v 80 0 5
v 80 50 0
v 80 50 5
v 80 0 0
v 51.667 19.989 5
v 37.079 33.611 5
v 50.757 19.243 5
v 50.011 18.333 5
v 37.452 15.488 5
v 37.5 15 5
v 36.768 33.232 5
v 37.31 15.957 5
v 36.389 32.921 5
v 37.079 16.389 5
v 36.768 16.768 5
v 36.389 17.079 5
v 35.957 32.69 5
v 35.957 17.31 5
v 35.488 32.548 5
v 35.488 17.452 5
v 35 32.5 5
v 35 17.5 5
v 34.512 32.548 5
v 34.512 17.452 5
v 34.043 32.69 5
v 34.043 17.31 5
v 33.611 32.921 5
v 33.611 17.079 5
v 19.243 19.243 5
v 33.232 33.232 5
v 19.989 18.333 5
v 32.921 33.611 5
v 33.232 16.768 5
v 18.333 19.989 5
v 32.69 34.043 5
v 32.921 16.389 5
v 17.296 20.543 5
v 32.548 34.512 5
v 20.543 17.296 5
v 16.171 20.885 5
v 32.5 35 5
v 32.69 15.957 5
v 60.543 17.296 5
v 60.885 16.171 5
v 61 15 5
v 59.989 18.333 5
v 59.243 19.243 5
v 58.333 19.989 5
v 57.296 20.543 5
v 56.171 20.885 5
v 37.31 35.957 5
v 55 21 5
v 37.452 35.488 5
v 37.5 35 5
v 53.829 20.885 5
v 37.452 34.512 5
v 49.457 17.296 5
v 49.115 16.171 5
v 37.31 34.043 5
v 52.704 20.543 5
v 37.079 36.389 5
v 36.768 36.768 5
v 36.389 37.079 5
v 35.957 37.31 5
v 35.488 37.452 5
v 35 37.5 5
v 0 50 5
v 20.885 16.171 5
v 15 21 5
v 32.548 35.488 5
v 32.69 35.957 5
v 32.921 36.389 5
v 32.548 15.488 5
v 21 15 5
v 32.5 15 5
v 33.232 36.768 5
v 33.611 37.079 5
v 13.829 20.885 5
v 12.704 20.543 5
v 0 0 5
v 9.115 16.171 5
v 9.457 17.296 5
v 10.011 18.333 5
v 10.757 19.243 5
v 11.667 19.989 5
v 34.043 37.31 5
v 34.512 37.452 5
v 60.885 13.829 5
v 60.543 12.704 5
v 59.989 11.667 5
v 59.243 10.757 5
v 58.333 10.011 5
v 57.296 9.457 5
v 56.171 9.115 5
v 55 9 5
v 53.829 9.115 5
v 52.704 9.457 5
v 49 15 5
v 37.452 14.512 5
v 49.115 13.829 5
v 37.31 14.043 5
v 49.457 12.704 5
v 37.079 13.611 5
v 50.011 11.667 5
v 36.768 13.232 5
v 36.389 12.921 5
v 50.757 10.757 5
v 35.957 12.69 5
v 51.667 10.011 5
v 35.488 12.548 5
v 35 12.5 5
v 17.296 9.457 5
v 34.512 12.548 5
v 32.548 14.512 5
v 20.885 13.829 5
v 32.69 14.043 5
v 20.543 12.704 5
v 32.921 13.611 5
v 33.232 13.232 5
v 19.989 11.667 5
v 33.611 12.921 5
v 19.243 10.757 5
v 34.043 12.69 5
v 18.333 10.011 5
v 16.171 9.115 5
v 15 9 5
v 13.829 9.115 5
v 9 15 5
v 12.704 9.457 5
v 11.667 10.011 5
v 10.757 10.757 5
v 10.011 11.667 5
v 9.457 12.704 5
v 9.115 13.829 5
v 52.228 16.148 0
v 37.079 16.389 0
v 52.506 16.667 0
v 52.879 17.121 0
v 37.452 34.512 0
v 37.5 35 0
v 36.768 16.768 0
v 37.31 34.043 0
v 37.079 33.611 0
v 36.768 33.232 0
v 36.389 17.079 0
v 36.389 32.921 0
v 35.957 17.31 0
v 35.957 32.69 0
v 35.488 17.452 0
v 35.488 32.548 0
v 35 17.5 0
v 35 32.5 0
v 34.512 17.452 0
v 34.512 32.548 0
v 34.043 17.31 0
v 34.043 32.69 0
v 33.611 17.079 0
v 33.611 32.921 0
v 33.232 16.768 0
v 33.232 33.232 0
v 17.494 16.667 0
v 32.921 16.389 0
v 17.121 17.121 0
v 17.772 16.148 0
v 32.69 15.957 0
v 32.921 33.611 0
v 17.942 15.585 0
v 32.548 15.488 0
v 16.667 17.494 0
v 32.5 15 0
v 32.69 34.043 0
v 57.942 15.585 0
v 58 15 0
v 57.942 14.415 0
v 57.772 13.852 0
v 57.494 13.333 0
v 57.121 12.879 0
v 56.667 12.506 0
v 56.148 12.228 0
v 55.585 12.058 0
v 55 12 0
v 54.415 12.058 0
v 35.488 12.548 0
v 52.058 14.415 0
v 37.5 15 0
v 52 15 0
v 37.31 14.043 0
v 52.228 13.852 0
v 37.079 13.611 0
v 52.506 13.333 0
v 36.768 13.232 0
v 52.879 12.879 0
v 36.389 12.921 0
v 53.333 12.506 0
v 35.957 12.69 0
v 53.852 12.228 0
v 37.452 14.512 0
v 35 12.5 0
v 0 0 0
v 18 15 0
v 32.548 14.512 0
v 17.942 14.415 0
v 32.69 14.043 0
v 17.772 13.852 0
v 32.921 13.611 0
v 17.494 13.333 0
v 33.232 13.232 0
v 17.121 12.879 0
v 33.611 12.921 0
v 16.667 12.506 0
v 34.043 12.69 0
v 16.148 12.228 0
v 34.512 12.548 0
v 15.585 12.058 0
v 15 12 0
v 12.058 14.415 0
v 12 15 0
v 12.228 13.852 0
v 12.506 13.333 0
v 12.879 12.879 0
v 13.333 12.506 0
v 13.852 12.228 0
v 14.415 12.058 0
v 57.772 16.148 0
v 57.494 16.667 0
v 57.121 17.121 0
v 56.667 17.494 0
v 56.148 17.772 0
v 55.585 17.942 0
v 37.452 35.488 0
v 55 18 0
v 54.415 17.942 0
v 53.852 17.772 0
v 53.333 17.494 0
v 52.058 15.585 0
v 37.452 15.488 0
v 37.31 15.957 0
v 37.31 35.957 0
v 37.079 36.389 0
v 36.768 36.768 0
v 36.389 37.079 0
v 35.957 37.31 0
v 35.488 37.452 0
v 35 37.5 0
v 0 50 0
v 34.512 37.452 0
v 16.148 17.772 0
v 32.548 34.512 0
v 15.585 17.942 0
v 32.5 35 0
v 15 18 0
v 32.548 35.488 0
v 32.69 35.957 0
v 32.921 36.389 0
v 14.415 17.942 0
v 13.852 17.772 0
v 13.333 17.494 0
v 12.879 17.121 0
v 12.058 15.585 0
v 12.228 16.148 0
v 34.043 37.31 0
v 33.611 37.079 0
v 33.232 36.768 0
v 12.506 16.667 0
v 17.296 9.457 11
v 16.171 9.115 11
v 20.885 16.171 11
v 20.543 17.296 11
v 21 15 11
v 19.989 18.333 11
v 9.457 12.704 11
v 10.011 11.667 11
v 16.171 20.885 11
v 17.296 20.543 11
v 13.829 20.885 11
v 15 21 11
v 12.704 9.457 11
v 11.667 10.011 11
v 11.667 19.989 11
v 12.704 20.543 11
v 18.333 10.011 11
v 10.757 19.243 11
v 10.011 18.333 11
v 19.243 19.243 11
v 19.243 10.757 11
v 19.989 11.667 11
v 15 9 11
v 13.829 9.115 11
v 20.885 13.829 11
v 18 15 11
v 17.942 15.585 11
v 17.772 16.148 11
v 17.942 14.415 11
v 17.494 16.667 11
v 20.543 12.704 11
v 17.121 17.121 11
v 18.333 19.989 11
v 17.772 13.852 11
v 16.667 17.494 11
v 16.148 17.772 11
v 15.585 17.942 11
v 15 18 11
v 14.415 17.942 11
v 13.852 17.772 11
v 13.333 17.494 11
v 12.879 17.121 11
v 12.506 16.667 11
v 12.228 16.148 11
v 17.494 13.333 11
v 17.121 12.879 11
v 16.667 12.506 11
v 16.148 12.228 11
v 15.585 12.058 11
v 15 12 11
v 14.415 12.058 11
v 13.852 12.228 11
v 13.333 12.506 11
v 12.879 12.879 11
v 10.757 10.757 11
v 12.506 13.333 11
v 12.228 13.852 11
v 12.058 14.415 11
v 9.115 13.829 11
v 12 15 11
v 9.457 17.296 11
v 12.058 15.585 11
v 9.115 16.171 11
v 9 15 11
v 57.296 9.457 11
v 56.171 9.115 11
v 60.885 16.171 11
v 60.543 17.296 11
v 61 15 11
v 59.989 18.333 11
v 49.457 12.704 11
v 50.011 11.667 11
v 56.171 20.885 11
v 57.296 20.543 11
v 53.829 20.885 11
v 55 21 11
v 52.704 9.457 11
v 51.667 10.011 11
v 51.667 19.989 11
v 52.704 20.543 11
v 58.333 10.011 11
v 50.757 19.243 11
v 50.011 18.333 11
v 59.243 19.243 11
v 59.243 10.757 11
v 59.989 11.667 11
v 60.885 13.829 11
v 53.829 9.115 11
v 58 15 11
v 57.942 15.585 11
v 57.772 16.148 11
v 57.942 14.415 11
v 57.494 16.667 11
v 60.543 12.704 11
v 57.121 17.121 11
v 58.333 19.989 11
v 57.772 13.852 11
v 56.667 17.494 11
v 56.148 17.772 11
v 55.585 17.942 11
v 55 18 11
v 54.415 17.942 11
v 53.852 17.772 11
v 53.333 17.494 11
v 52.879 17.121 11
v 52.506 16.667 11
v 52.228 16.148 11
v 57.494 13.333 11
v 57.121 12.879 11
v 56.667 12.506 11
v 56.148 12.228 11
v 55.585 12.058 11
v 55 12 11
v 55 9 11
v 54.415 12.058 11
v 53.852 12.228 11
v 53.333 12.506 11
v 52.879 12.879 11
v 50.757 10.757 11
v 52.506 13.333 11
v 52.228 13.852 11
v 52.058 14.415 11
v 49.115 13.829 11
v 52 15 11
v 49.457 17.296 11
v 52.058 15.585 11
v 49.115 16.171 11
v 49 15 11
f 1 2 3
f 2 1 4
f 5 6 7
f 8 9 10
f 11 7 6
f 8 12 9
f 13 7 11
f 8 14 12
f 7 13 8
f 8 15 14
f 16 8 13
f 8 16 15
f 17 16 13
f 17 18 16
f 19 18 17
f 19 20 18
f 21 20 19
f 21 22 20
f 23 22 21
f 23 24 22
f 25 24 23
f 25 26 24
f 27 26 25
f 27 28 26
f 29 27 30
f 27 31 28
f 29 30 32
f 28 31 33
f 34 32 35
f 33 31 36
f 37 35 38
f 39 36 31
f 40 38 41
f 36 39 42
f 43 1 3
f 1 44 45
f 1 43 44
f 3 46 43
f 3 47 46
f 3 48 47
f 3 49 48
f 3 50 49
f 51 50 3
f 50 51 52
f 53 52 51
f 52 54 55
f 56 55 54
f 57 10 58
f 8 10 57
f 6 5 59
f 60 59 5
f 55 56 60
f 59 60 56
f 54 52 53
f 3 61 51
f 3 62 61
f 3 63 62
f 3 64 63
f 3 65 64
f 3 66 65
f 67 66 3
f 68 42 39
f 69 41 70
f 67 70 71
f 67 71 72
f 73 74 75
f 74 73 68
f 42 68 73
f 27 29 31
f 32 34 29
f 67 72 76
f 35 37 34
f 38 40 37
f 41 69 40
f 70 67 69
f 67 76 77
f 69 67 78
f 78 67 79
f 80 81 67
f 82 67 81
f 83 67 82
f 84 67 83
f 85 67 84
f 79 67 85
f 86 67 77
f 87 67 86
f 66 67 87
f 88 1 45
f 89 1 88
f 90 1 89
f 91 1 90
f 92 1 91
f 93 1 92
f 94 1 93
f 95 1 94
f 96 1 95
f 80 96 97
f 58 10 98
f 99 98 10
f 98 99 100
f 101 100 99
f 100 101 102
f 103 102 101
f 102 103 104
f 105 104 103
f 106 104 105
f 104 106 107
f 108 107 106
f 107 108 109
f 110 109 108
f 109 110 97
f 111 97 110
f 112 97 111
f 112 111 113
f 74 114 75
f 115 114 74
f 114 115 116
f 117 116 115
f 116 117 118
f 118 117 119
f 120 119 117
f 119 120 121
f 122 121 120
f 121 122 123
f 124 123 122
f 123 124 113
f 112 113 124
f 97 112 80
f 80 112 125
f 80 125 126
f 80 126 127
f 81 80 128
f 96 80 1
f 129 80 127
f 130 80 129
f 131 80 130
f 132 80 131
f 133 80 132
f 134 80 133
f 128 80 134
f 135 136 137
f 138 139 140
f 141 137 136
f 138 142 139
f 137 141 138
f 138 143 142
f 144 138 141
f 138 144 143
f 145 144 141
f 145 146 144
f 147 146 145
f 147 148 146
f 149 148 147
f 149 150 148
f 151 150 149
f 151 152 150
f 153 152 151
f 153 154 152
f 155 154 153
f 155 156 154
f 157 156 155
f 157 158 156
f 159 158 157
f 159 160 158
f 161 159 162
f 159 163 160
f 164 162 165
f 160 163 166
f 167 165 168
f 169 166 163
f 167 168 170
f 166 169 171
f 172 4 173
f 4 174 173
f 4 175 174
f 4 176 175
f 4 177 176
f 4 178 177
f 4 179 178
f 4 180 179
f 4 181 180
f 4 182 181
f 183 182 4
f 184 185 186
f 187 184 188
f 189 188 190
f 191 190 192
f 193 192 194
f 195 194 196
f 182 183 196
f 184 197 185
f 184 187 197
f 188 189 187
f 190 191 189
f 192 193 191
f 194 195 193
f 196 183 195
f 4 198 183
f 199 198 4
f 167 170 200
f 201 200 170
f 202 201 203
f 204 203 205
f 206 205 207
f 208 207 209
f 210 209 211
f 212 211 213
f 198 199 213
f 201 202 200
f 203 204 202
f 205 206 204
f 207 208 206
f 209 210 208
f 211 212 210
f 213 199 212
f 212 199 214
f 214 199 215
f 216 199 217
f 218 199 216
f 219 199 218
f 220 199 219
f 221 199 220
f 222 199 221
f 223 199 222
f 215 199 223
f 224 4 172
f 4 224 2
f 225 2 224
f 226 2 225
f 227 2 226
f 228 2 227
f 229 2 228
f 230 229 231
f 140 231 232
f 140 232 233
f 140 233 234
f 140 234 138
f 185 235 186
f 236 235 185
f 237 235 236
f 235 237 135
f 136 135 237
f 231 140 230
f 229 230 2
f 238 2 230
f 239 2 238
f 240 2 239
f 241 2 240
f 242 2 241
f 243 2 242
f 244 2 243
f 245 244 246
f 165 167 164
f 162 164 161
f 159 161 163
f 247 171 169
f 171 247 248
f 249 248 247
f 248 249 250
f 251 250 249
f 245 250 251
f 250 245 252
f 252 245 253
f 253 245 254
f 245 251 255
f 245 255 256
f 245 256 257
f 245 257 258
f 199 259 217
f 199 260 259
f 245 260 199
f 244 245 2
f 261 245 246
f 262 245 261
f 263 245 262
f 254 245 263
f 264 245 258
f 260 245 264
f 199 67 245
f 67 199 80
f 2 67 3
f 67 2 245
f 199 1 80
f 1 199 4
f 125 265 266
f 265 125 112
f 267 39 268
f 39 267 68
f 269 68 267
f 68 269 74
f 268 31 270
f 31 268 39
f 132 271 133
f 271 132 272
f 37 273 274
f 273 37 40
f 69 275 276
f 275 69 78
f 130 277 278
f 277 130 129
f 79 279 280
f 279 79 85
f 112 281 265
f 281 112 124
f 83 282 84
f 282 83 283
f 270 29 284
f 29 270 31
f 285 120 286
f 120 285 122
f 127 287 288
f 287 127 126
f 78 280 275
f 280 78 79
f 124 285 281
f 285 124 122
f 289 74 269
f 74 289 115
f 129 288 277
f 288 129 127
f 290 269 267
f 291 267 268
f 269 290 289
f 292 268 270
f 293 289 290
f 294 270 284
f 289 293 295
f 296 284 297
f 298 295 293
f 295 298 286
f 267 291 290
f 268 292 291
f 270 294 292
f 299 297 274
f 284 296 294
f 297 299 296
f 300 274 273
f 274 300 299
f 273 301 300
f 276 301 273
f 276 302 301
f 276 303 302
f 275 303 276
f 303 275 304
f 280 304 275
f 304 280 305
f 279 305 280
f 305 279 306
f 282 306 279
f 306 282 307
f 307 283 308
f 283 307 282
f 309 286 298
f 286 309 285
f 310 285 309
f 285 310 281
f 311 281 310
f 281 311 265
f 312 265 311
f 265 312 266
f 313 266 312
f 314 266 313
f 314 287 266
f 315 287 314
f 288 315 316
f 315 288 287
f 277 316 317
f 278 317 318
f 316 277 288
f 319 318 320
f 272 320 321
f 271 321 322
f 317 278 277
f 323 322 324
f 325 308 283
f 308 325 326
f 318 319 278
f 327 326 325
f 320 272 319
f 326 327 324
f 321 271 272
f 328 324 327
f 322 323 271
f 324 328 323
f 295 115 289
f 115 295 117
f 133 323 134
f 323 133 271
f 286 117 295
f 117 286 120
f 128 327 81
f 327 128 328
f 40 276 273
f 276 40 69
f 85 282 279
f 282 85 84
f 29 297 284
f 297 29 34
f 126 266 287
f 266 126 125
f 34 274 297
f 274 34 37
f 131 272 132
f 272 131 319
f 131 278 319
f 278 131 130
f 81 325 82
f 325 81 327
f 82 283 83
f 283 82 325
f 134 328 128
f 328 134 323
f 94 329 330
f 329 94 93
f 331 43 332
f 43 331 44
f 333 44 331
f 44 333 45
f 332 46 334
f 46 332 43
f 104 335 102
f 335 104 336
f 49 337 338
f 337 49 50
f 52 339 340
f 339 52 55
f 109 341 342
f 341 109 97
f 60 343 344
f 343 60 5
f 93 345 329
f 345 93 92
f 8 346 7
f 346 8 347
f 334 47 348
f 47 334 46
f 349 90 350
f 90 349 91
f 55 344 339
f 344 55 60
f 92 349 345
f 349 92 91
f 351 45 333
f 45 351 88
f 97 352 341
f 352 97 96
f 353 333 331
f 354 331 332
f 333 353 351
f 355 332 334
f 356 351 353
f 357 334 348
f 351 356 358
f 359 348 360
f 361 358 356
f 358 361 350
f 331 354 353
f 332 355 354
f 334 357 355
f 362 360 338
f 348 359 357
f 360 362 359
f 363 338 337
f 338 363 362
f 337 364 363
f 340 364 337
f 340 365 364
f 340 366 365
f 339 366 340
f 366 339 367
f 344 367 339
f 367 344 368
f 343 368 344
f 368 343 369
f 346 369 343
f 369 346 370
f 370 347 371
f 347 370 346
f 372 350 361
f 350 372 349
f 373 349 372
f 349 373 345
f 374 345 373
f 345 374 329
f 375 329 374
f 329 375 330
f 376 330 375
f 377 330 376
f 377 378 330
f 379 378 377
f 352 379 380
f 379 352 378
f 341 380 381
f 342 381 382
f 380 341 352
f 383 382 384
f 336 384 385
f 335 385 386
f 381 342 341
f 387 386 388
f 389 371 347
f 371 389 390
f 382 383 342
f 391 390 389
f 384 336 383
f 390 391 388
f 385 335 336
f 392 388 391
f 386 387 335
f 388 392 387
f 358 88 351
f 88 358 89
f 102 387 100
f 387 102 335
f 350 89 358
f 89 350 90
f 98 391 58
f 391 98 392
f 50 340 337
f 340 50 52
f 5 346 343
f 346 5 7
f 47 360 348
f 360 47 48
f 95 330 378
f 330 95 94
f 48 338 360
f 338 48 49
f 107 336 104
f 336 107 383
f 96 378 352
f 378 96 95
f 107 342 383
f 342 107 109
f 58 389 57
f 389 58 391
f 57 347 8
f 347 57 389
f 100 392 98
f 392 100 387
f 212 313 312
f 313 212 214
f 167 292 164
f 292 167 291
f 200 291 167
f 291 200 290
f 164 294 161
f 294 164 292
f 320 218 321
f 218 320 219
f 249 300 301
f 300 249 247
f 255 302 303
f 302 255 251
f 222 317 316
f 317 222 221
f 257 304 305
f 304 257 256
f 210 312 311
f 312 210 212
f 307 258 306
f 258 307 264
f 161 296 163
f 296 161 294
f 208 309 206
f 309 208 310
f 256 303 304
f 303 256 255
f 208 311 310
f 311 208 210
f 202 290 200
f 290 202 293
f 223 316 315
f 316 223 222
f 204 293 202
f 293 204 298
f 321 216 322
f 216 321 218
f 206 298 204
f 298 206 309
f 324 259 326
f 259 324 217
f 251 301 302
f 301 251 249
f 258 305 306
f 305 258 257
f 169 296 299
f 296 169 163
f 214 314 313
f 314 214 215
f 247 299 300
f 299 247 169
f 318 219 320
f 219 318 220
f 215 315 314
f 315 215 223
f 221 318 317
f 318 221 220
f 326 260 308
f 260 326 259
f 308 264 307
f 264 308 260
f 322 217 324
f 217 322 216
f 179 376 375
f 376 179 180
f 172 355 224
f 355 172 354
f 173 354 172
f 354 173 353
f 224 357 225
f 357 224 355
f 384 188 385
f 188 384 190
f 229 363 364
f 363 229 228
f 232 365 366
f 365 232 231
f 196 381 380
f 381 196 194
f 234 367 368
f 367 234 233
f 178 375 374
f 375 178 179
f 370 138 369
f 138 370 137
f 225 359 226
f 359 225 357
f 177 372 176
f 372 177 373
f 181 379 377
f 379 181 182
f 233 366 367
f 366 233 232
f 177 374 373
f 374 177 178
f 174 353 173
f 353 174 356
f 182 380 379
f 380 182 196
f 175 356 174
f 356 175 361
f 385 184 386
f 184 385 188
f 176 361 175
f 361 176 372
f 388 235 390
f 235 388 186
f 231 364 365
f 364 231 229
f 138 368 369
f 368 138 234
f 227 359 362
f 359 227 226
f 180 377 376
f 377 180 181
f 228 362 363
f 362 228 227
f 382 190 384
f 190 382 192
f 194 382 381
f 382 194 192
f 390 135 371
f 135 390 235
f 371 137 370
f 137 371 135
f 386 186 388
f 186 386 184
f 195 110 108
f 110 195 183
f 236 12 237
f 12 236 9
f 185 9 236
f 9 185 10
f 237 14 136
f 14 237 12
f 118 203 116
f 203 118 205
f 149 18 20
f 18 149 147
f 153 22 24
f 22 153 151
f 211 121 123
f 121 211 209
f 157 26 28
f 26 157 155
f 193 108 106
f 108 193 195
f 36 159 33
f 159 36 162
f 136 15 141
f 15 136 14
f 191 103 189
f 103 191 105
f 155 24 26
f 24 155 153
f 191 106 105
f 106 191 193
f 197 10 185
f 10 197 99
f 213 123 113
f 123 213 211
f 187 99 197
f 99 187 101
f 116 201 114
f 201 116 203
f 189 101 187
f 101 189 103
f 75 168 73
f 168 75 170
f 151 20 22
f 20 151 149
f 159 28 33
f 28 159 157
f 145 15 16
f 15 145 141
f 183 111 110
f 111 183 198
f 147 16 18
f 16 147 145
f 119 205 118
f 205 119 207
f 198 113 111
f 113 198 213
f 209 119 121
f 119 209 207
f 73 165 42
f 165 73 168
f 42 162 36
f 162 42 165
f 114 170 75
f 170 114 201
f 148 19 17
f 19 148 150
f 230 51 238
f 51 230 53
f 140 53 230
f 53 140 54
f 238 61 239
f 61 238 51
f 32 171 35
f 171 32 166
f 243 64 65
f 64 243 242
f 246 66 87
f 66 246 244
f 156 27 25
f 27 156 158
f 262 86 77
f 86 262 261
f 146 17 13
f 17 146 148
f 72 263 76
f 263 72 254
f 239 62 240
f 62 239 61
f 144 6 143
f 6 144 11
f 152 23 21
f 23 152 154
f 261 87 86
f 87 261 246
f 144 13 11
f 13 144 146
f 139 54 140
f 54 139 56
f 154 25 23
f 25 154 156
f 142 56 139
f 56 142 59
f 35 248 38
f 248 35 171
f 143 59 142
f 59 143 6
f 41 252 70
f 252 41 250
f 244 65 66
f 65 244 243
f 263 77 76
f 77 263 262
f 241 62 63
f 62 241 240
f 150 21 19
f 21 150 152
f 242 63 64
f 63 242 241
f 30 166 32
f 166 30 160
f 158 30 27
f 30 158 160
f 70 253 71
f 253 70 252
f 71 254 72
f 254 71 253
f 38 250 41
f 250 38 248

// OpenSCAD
$fn = 32;

// ----------------------------------------------------------------------
// Mixed field: bosses and holes at given coordinates
// ----------------------------------------------------------------------

// --- parameters (mm) ---
plate_l = 80;             // plate length, X
plate_w = 50;             // plate width, Y
plate_t = 5;              // plate thickness, Z
boss_d = 12;              // boss diameter
boss_h = 6;               // boss height above the plate
hole_d = 5;               // through hole diameter
fit_tol = 0.05;           // tolerance for press fits, mm
free_tol = 0.2;           // tolerance for clearance fits, mm

total_h = plate_t + boss_h;  // overall height

difference() {
  union() {
    cube([plate_l, plate_w, plate_t]);
    translate([15, 15, plate_t]) cylinder(h = boss_h, d = boss_d);
    translate([55, 15, plate_t]) cylinder(h = boss_h, d = boss_d);
  }
  translate([15, 15, -1]) cylinder(h = total_h + 2, d = boss_d / 2);
  translate([55, 15, -1]) cylinder(h = total_h + 2, d = boss_d / 2);
  translate([35, 15, -1]) cylinder(h = plate_t + 2, d = hole_d);
  translate([35, 35, -1]) cylinder(h = plate_t + 2, d = hole_d);
}
